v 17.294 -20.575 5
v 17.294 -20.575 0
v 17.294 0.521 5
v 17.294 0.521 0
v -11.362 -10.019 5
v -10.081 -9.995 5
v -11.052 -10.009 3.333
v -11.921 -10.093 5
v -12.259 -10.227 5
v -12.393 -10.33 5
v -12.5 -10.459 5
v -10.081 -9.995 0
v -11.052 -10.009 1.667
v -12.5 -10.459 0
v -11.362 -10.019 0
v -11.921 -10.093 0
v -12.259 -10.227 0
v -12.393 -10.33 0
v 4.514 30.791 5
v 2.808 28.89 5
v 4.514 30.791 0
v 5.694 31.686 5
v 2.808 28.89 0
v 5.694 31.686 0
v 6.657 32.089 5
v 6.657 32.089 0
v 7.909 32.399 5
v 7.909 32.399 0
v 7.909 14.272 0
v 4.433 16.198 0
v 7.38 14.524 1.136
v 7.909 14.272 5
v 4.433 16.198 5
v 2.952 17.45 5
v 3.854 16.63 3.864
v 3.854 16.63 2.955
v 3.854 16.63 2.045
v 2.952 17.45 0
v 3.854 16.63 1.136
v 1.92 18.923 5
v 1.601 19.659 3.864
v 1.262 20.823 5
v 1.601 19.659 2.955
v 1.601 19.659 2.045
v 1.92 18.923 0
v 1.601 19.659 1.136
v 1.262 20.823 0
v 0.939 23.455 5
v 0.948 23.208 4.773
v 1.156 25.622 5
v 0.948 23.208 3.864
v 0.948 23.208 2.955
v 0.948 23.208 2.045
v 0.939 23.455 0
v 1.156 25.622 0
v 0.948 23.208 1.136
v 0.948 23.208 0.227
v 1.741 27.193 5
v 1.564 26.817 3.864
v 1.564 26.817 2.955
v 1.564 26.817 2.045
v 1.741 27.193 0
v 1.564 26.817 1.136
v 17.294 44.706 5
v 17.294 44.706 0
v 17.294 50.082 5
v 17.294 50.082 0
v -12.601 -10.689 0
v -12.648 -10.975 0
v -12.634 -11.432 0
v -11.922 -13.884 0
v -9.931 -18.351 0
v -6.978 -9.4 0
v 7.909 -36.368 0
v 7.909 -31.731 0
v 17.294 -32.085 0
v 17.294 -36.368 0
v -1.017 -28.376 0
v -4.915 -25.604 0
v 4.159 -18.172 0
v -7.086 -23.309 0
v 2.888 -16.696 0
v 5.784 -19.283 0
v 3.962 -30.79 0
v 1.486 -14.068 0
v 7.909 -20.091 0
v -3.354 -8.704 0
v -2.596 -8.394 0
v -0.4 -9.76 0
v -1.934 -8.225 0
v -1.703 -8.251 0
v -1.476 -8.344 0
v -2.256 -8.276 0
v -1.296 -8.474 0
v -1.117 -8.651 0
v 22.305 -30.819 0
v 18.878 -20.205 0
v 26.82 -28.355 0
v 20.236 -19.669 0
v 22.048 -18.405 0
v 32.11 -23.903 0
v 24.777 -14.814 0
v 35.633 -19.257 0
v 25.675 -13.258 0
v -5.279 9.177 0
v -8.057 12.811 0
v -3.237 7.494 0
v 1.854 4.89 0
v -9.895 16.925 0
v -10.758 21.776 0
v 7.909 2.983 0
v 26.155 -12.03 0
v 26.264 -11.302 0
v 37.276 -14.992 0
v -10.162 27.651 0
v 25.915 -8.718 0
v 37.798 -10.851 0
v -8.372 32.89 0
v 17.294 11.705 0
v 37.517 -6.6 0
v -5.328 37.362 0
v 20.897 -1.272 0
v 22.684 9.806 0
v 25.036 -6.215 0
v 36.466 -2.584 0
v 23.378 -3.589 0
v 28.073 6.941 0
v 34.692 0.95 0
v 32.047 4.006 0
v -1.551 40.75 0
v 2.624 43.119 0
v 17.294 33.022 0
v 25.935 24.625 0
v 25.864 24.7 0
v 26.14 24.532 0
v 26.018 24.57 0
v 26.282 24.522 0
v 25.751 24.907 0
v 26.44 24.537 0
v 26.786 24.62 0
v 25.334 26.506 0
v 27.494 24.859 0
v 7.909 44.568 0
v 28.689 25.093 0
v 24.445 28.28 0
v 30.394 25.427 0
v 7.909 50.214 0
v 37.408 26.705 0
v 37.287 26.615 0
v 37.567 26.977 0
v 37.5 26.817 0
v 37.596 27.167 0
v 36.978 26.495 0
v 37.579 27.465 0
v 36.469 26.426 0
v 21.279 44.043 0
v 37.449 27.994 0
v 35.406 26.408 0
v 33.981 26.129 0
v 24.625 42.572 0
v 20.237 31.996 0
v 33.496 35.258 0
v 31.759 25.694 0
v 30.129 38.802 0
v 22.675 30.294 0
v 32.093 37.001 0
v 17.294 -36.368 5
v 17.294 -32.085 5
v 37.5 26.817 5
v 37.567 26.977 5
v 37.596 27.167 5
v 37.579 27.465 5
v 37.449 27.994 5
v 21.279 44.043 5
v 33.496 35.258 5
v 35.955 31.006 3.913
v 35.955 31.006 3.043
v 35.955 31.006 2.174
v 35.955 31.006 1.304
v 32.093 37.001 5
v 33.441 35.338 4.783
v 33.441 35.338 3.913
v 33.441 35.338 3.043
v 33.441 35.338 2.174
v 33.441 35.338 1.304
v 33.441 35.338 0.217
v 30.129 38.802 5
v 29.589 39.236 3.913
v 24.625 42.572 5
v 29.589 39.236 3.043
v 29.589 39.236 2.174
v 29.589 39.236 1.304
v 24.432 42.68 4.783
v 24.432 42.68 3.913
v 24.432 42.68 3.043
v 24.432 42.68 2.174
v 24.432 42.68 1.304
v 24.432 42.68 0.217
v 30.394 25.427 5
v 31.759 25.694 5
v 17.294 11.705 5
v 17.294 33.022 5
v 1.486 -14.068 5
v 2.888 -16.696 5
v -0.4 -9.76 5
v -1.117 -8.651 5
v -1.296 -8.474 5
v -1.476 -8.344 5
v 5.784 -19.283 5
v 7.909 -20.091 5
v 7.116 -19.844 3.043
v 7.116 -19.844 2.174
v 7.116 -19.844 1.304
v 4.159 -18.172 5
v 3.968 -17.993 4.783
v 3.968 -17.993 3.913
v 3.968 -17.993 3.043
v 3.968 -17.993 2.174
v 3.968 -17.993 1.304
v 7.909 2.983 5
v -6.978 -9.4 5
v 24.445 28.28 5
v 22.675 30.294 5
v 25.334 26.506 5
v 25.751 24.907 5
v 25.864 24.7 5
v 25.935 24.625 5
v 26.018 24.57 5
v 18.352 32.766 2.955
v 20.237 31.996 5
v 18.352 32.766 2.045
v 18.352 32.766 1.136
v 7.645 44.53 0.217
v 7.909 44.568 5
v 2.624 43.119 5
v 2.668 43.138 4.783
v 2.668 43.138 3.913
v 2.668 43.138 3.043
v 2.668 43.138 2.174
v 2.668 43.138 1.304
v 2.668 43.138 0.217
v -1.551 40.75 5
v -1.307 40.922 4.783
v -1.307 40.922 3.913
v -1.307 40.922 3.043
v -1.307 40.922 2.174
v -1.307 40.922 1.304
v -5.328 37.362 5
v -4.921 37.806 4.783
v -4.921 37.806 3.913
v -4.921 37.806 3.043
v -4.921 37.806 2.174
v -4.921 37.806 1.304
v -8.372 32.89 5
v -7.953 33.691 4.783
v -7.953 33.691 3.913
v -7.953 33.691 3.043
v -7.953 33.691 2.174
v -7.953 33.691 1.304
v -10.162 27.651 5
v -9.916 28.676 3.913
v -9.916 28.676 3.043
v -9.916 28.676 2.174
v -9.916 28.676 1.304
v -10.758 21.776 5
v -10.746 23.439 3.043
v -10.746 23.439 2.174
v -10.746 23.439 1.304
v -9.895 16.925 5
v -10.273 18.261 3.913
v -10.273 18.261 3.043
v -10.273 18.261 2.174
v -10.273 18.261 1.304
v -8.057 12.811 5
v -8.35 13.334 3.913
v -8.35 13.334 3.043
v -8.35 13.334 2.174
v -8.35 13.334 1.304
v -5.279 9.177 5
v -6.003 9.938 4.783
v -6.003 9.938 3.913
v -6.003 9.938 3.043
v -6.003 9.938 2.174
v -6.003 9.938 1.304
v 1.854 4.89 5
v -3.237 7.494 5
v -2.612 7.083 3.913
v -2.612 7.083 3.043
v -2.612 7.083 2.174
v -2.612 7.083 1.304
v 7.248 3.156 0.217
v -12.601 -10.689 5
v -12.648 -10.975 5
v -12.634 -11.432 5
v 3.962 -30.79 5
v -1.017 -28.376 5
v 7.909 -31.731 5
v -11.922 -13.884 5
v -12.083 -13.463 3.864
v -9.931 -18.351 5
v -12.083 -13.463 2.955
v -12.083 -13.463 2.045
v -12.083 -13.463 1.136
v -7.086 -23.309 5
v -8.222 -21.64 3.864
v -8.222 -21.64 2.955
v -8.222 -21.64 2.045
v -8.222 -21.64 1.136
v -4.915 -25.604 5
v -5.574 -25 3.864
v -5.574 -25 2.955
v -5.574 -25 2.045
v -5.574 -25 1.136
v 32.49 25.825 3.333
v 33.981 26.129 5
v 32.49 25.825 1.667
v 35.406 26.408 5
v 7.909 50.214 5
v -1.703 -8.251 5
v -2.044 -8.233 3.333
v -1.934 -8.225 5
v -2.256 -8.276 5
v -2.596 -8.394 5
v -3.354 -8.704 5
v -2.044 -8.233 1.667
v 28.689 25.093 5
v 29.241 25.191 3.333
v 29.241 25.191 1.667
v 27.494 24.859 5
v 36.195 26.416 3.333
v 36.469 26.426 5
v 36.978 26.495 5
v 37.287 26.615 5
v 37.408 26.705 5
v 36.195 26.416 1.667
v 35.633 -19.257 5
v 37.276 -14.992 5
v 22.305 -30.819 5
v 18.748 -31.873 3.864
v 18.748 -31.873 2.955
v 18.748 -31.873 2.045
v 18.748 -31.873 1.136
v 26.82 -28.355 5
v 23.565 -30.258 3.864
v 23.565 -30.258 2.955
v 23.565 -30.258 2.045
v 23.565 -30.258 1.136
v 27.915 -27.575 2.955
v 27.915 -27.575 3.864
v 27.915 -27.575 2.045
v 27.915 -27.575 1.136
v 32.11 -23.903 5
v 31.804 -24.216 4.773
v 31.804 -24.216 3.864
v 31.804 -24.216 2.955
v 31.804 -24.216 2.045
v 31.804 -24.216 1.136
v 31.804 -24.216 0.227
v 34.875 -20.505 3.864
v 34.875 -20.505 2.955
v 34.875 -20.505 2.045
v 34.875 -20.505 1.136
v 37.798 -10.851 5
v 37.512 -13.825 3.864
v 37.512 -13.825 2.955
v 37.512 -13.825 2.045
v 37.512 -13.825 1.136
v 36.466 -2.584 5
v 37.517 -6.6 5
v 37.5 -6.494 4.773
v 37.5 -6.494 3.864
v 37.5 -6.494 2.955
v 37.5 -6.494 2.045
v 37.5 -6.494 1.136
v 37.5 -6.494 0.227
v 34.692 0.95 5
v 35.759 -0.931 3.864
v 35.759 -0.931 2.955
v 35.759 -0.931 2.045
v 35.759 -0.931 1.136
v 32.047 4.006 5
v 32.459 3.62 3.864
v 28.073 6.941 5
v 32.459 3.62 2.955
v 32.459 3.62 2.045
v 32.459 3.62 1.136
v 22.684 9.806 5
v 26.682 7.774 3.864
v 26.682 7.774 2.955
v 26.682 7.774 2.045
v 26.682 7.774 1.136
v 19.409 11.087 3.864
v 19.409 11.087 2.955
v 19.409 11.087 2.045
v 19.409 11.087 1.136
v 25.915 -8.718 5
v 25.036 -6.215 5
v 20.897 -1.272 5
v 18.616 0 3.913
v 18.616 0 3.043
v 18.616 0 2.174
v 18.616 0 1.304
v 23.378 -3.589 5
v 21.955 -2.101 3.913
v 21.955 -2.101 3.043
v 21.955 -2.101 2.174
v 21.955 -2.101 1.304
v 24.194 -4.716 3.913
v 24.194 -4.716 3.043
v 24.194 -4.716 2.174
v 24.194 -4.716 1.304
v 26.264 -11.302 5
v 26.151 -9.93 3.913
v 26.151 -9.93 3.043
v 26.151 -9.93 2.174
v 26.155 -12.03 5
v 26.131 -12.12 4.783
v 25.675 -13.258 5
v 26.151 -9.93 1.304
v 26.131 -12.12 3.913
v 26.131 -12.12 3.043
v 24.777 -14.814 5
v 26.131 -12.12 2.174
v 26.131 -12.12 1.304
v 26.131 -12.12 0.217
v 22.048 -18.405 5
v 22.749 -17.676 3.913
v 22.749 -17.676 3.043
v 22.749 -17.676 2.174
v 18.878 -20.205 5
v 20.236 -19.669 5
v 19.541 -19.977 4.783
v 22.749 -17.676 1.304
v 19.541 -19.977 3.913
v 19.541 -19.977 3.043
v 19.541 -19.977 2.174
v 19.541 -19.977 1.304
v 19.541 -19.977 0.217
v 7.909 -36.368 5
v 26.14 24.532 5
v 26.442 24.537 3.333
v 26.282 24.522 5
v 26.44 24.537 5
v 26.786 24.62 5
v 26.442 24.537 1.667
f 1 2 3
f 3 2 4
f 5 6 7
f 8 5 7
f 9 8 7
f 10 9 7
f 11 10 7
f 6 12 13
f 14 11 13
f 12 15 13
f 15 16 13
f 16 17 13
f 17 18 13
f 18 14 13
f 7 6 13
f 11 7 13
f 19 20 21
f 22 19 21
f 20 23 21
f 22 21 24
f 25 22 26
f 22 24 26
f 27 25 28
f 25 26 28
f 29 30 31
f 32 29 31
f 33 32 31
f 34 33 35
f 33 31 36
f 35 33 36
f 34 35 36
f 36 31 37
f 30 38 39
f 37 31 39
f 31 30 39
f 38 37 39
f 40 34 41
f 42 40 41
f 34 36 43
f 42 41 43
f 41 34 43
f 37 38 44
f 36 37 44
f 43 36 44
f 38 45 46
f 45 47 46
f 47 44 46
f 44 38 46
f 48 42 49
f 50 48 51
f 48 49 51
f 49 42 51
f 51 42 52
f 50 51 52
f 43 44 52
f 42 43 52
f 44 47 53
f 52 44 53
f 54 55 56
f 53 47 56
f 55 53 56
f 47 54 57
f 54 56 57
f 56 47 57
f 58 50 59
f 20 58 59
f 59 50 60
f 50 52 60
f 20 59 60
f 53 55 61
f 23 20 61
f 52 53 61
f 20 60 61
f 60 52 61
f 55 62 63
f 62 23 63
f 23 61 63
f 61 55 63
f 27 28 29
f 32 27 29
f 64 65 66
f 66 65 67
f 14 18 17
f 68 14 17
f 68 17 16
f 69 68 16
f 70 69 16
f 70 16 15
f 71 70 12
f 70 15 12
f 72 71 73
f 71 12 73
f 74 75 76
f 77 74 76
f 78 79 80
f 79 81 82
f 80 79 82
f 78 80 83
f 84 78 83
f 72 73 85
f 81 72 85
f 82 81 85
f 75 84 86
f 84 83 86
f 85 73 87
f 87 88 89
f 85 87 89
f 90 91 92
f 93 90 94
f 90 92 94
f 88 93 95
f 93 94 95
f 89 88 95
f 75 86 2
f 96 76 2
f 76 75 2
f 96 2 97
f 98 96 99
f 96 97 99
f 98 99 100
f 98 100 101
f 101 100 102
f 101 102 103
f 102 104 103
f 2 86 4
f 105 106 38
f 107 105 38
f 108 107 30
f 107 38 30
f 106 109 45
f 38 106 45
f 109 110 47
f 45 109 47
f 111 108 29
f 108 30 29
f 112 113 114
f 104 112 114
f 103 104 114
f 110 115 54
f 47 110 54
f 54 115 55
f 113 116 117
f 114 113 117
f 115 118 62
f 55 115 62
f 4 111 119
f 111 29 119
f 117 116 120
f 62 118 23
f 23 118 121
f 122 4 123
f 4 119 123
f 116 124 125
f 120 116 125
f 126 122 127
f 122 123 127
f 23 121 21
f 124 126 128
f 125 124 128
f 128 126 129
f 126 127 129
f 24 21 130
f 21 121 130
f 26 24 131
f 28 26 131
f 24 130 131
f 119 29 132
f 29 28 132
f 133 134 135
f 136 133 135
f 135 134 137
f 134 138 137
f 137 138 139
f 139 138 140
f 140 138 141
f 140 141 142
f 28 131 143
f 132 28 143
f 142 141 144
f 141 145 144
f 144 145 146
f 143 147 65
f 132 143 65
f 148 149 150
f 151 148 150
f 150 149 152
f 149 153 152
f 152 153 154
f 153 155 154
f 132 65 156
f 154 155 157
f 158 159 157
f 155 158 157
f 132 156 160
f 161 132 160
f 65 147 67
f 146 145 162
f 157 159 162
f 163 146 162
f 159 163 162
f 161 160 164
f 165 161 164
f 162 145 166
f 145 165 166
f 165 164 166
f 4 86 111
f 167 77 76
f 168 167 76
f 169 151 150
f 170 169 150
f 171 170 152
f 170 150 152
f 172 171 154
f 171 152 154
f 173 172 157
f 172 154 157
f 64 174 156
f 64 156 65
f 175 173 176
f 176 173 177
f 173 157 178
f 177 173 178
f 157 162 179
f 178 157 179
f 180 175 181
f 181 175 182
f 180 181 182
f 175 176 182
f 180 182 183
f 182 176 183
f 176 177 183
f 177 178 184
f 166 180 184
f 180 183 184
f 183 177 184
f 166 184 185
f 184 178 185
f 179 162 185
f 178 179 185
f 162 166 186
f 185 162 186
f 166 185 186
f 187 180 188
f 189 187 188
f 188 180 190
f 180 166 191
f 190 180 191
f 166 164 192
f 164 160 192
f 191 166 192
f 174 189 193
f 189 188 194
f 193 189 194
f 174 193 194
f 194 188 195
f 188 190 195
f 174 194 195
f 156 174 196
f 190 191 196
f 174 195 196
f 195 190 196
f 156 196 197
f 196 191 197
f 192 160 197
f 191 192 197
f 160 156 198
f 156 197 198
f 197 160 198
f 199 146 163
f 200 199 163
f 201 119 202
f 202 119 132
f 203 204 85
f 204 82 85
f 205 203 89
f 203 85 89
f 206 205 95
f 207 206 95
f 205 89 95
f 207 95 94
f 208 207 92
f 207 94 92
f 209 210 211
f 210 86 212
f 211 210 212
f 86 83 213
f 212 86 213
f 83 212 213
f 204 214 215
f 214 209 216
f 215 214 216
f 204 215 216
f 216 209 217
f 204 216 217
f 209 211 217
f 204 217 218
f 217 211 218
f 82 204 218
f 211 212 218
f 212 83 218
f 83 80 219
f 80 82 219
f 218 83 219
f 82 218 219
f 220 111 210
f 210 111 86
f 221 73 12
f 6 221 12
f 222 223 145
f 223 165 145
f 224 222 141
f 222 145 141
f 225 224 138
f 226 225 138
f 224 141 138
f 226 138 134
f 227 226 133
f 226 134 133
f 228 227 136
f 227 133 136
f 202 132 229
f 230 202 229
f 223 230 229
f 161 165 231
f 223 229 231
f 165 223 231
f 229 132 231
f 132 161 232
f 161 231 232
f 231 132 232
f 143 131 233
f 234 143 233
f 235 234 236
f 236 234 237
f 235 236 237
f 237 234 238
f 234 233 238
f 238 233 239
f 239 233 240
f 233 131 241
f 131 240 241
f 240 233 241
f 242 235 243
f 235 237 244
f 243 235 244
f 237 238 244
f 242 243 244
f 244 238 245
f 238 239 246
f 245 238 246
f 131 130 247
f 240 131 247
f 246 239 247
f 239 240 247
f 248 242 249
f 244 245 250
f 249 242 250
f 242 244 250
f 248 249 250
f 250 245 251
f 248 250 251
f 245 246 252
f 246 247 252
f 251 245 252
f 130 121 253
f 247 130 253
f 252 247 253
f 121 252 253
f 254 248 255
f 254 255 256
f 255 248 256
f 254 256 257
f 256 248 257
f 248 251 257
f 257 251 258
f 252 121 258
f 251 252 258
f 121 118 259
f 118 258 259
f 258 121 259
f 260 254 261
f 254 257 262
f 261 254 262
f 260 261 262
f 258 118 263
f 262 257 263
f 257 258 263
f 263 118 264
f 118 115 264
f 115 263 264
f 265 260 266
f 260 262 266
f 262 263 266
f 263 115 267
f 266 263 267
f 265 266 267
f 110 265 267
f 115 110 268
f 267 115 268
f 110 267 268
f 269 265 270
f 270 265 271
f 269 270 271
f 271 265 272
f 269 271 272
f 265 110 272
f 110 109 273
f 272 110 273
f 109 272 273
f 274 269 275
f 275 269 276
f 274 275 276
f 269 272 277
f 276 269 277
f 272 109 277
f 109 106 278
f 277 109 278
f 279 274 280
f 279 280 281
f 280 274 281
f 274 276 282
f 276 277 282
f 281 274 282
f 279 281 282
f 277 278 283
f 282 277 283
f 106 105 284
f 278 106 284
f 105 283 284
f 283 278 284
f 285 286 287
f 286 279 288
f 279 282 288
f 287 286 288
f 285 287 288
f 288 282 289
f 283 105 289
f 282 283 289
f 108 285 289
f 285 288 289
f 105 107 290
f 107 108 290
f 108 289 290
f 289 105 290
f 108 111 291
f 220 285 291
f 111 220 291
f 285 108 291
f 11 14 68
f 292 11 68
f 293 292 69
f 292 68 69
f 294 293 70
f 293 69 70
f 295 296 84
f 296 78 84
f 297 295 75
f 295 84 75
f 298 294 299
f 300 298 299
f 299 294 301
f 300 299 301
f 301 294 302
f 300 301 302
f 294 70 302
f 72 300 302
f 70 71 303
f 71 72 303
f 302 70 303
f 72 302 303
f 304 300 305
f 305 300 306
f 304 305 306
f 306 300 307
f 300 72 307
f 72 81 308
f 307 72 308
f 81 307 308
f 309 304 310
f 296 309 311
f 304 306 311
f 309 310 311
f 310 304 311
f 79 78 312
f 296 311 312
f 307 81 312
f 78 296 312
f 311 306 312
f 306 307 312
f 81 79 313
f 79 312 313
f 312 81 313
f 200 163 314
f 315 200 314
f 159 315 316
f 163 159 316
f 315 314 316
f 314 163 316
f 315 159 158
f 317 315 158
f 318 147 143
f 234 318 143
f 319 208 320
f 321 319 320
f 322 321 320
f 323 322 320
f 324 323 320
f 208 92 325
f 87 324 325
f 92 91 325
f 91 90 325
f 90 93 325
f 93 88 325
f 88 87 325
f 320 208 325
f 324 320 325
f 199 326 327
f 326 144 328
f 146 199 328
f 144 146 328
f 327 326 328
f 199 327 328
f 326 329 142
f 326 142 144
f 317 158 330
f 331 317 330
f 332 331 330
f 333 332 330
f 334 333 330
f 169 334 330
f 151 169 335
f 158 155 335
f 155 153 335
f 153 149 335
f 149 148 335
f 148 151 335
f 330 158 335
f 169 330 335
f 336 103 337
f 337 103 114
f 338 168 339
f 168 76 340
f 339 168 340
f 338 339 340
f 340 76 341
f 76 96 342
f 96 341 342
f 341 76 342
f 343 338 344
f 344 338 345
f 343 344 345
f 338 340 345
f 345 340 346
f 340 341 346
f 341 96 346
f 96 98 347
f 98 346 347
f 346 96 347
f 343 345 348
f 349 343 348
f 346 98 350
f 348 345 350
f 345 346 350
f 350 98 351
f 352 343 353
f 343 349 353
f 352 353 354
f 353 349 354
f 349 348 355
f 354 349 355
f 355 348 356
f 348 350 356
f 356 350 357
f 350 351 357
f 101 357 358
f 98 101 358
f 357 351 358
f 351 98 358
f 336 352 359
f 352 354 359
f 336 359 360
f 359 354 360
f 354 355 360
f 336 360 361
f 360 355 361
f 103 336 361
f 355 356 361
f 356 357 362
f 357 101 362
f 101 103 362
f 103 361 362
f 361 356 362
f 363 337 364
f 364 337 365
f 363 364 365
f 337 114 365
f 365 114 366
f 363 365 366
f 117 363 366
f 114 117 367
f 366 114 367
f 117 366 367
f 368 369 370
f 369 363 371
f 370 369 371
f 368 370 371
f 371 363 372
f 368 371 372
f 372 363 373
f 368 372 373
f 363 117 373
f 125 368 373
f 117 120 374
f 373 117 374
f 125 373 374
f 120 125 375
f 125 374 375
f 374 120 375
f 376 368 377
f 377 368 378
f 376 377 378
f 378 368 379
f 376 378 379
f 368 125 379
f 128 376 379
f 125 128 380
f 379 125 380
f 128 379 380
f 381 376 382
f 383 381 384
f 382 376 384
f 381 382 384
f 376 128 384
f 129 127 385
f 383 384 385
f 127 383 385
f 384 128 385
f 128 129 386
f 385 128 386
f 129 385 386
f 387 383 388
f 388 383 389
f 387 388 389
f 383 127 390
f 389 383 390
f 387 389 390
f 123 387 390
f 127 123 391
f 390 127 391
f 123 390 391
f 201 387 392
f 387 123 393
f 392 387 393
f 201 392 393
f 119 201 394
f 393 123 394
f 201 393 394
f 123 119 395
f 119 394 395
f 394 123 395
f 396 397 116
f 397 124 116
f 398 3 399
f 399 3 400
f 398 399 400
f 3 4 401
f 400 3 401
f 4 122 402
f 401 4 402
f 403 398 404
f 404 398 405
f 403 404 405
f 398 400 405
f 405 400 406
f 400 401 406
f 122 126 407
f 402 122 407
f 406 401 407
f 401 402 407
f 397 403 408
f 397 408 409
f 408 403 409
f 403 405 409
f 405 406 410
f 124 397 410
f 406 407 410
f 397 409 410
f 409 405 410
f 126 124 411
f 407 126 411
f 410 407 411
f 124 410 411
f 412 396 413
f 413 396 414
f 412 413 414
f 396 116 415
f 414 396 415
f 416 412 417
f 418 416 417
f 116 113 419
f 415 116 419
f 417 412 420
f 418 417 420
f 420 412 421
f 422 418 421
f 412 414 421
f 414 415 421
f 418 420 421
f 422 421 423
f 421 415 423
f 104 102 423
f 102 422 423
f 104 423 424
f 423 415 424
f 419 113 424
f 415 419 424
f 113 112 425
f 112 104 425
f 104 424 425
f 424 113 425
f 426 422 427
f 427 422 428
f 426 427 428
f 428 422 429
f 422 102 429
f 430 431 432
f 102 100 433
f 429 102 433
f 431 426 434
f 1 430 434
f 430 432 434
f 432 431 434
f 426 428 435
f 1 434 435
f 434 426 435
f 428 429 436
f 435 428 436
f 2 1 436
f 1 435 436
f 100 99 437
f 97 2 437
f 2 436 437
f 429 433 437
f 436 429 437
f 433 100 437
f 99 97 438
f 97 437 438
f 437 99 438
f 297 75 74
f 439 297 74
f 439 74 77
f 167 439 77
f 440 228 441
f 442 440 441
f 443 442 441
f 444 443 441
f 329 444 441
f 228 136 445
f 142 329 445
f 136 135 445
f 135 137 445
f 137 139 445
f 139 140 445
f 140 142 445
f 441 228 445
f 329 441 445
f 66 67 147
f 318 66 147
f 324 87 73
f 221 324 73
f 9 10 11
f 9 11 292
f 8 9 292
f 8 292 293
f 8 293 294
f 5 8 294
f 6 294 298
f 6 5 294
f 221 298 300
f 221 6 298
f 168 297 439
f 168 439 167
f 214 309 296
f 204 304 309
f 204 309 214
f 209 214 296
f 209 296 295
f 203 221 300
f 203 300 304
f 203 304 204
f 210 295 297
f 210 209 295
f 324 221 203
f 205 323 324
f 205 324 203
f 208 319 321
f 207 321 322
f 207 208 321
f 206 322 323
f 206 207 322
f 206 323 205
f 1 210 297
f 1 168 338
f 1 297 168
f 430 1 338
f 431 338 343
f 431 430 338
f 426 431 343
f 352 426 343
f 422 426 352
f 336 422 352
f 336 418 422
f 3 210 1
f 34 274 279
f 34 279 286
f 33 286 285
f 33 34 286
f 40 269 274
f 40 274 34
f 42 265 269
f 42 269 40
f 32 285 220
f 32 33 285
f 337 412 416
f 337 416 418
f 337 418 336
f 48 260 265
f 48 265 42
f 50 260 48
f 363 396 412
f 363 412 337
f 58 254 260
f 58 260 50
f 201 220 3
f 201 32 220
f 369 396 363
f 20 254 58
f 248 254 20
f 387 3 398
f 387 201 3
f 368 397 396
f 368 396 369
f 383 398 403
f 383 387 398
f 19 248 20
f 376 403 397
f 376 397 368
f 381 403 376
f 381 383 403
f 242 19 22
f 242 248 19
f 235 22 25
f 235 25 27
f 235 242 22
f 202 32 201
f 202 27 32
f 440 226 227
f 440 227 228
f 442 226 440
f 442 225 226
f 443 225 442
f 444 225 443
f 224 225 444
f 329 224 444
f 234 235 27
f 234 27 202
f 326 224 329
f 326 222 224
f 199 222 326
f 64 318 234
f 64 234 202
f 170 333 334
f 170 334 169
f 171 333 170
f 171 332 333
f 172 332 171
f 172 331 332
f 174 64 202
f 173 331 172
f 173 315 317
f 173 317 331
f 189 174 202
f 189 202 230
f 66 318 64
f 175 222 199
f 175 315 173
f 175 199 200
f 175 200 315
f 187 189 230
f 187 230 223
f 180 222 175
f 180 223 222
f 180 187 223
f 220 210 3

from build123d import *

# Parameters (mm, degrees)
F1_DEPTH = 5
F3_DEPTH = 5


# Not quite as in the source:
# - ends of sketch curves that miss each other by under 0.0002 mm in the source are joined


with BuildPart() as f1:
    # F0 (on Top) → F1 (new body)
    with BuildSketch(Plane.XY):
        with BuildLine():
            add(Edge.make_bspline(
                [(35.4062364212, 26.4075431064), (36.1136138051, 26.4375571122), (37.1920857039, 26.3162993106), (37.5000004827, 26.8173329532)],
                knots=[0.9891130914, 0.9891130914, 0.9891130914, 0.9891130914, 1, 1, 1, 1], degree=3))
            Line((37.5000004827, 26.8173329532), (35.4062364212, 26.4075431064))
        make_face()
        with BuildLine():
            Line((35.4062364212, 26.4075431064), (37.5000004827, 26.8173329532))
            add(Edge.make_bspline(
                [(37.5000004827, 26.8173329532), (37.9973083609, 27.626543796), (34.9123021991, 32.5873489734), (32.7949088716, 37.1897556584), (24.3027338054, 43.1267309099), (19.169003707, 44.8923617288), (7.4598902451, 45.1060959203), (1.1897145625, 42.6781312373), (-3.8120923938, 39.3082420584), (-8.3975827588, 33.8837589271), (-10.6150276555, 26.8781022613), (-11.0693390019, 19.8953460452), (-8.6400083438, 13.0680757921), (-3.8097449962, 6.818918491), (7.098891731, 2.7978051401), (18.6539113372, 0.7987680613), (23.4954239403, -3.2235491862), (25.6191120408, -7.1395973632), (26.1759914014, -9.9044108084), (26.4578971493, -12.1962753352), (24.05257382, -15.9975311089), (20.2331488923, -21.4307798521), (6.3264948767, -20.8637776593), (1.7512699941, -16.0141911602), (-0.3644556238, -8.9908558965), (-1.4762532664, -8.344146423)],
                knots=[0, 0, 0, 0, 0.0175832594, 0.0358597298, 0.0588860231, 0.0769168699, 0.1019008471, 0.1213566894, 0.1392971613, 0.1589566475, 0.1790587295, 0.1986072677, 0.2183003743, 0.2387106394, 0.2641094999, 0.2897108509, 0.3079044406, 0.3232934463, 0.3355975298, 0.3464371002, 0.3617101189, 0.3803717423, 0.4066458723, 0.4263882219, 0.4468914028, 0.4468914028, 0.4468914028, 0.4468914028], degree=3))
            Line((-1.4762532664, -8.344146423), (-3.3538070747, -8.7043670617))
            add(Edge.make_bspline(
                [(-3.3538070747, -8.7043670617), (-4.3961030163, -9.0785878191), (-5.7923316991, -9.172210662), (-6.977947746, -9.3996772122)],
                knots=[0.4571971679, 0.4571971679, 0.4571971679, 0.4571971679, 0.4714944637, 0.4714944637, 0.4714944637, 0.4714944637], degree=3))
            add(Edge.make_bspline(
                [(-6.977947746, -9.3996772122), (-6.9813423589, -9.4003284862), (-8.0810994233, -9.6117855626), (-8.9980666521, -9.939542333), (-10.0812918203, -9.9950777943)],
                knots=[0.4714944637, 0.4714944637, 0.4714944637, 0.4714944637, 0.4715353992, 0.4847631381, 0.4847631381, 0.4847631381, 0.4847631381], degree=3))
            Line((-10.0812918203, -9.9950777943), (-12.4999995173, -10.459122248))
            add(Edge.make_bspline(
                [(-12.4999995173, -10.459122248), (-13.126901554, -11.4363217572), (-10.0620076243, -18.071207169), (-6.6572928739, -25.453264179), (3.6944606077, -31.1633139716), (8.9573246108, -31.9190126967), (19.2131315433, -32.828607643), (28.1944728773, -27.9884701152), (35.3339415951, -20.9026515006), (37.9212850063, -14.0402369382), (37.8967425581, -6.45170622), (35.5823181115, 0.3428764855), (30.8312502632, 5.7611625668), (19.729691585, 11.6834204472), (11.6697951489, 12.6692531996), (7.461612409, 14.3735968882), (2.0146611718, 17.3677263892), (0.8400309809, 22.2167360632), (0.8804248433, 26.9117301401), (5.0986415272, 31.7191380502), (7.7382723724, 32.3960622929), (18.908113489, 34.7526975815), (25.7548504177, 27.5466796426), (25.5917068321, 24.7768521377), (26.0184388608, 24.57017079)],
                knots=[0.4964601716, 0.4964601716, 0.4964601716, 0.4964601716, 0.5162392615, 0.5388537913, 0.5634156905, 0.5809728234, 0.6041261586, 0.627965304, 0.6513159606, 0.6711925222, 0.6914715047, 0.7110009296, 0.7308632035, 0.7572517914, 0.778353885, 0.7941959907, 0.8121364664, 0.8281945183, 0.8442785556, 0.8621343822, 0.874711514, 0.8989580497, 0.9214301919, 0.9329361544, 0.9329361544, 0.9329361544, 0.9329361544], degree=3))
            Line((26.0184388608, 24.57017079), (27.4935914991, 24.8588864981))
            add(Edge.make_bspline(
                [(27.493591499, 24.8588864981), (27.9377033488, 24.9991084414), (28.2605398181, 25.0247596569), (28.689210115, 25.0928920283)],
                knots=[0.9420743235, 0.9420743235, 0.9420743235, 0.9420743235, 0.9503012391, 0.9503012391, 0.9503012391, 0.9503012391], degree=3))
            Line((28.689210115, 25.0928920283), (30.3940653973, 25.4265649563))
            add(Edge.make_bspline(
                [(30.3940653973, 25.4265649563), (30.8684922538, 25.525339568), (31.2367282875, 25.5988500193), (31.7592196718, 25.6937518716)],
                knots=[0.9601251512, 0.9601251512, 0.9601251512, 0.9601251512, 0.9689160154, 0.9689160154, 0.9689160154, 0.9689160154], degree=3))
            Line((31.7592196718, 25.6937518716), (33.9809155123, 26.128580425))
            add(Edge.make_bspline(
                [(33.9809155123, 26.128580425), (34.49158124, 26.255037971), (34.8225983305, 26.3827793559), (35.4062364212, 26.4075431064)],
                knots=[0.9801305953, 0.9801305953, 0.9801305953, 0.9801305953, 0.9891130914, 0.9891130914, 0.9891130914, 0.9891130914], degree=3))
        make_face()
        with BuildLine():
            Line((33.9809155123, 26.128580425), (35.4062364212, 26.4075431064))
            add(Edge.make_bspline(
                [(33.9809155123, 26.128580425), (34.49158124, 26.255037971), (34.8225983305, 26.3827793559), (35.4062364212, 26.4075431064)],
                knots=[0.9801305953, 0.9801305953, 0.9801305953, 0.9801305953, 0.9891130914, 0.9891130914, 0.9891130914, 0.9891130914], degree=3))
        make_face()
        with BuildLine():
            Line((-3.3538070747, -8.7043670617), (-1.4762532664, -8.344146423))
            add(Edge.make_bspline(
                [(-1.4762532664, -8.344146423), (-2.0350897385, -8.0190829163), (-2.6025001683, -8.434621562), (-3.3538070747, -8.7043670617)],
                knots=[0.4468914028, 0.4468914028, 0.4468914028, 0.4468914028, 0.4571971679, 0.4571971679, 0.4571971679, 0.4571971679], degree=3))
        make_face()
        with BuildLine():
            add(Edge.make_bspline(
                [(31.7592196718, 25.6937518716), (32.4257663489, 25.8148189671), (33.3433531298, 25.9706991145), (33.9809155123, 26.128580425)],
                knots=[0.9689160154, 0.9689160154, 0.9689160154, 0.9689160154, 0.9801305953, 0.9801305953, 0.9801305953, 0.9801305953], degree=3))
            Line((33.9809155123, 26.128580425), (31.7592196718, 25.6937518716))
        make_face()
        with BuildLine():
            add(Edge.make_bspline(
                [(-3.3538070747, -8.7043670617), (-4.3961030163, -9.0785878191), (-5.7923316991, -9.172210662), (-6.977947746, -9.3996772122)],
                knots=[0.4571971679, 0.4571971679, 0.4571971679, 0.4571971679, 0.4714944637, 0.4714944637, 0.4714944637, 0.4714944637], degree=3))
            Line((-3.3538070747, -8.7043670617), (-6.977947746, -9.3996772122))
        make_face()
        with BuildLine():
            Line((30.3940653973, 25.4265649563), (31.7592196718, 25.6937518716))
            add(Edge.make_bspline(
                [(30.3940653973, 25.4265649563), (30.8684922538, 25.525339568), (31.2367282875, 25.5988500193), (31.7592196718, 25.6937518716)],
                knots=[0.9601251512, 0.9601251512, 0.9601251512, 0.9601251512, 0.9689160154, 0.9689160154, 0.9689160154, 0.9689160154], degree=3))
        make_face()
        with BuildLine():
            add(Edge.make_bspline(
                [(-6.977947746, -9.3996772122), (-6.9813423589, -9.4003284862), (-8.0810994233, -9.6117855626), (-8.9980666521, -9.939542333), (-10.0812918203, -9.9950777943)],
                knots=[0.4714944637, 0.4714944637, 0.4714944637, 0.4714944637, 0.4715353992, 0.4847631381, 0.4847631381, 0.4847631381, 0.4847631381], degree=3))
            Line((-6.977947746, -9.3996772122), (-10.0812918203, -9.9950777943))
        make_face()
        with BuildLine():
            add(Edge.make_bspline(
                [(28.689210115, 25.0928920283), (29.2010932456, 25.1742501533), (29.8638868401, 25.316182965), (30.3940653973, 25.4265649563)],
                knots=[0.9503012391, 0.9503012391, 0.9503012391, 0.9503012391, 0.9601251512, 0.9601251512, 0.9601251512, 0.9601251512], degree=3))
            Line((30.3940653973, 25.4265649563), (28.689210115, 25.0928920283))
        make_face()
        with BuildLine():
            Line((-12.4999995173, -10.459122248), (-10.0812918203, -9.9950777943))
            add(Edge.make_bspline(
                [(-10.0812918203, -9.9950777943), (-11.0391668712, -10.0441867278), (-12.129259803, -9.8812222802), (-12.4999995173, -10.459122248)],
                knots=[0.4847631381, 0.4847631381, 0.4847631381, 0.4847631381, 0.4964601716, 0.4964601716, 0.4964601716, 0.4964601716], degree=3))
        make_face()
        with BuildLine():
            Line((27.4935914991, 24.8588864981), (28.689210115, 25.0928920283))
            add(Edge.make_bspline(
                [(27.493591499, 24.8588864981), (27.9377033488, 24.9991084414), (28.2605398181, 25.0247596569), (28.689210115, 25.0928920283)],
                knots=[0.9420743235, 0.9420743235, 0.9420743235, 0.9420743235, 0.9503012391, 0.9503012391, 0.9503012391, 0.9503012391], degree=3))
        make_face()
        with BuildLine():
            add(Edge.make_bspline(
                [(26.0184388608, 24.57017079), (26.357354393, 24.4060220637), (27.0002876466, 24.7031328858), (27.493591499, 24.8588864981)],
                knots=[0.9329361544, 0.9329361544, 0.9329361544, 0.9329361544, 0.9420743235, 0.9420743235, 0.9420743235, 0.9420743235], degree=3))
            Line((27.4935914991, 24.8588864981), (26.0184388608, 24.57017079))
        make_face()
    extrude(amount=F1_DEPTH)

    # F2 (on Top) → F3 (join)
    with BuildSketch(Plane.XY):
        Polygon((17.2941591591, 50.0820688903), (7.9089542851, 50.2142570913), (7.9089542851, -36.3675840199), (17.2941591591, -36.3675840199), align=None)
    extrude(amount=F3_DEPTH)


solid = f1.part
